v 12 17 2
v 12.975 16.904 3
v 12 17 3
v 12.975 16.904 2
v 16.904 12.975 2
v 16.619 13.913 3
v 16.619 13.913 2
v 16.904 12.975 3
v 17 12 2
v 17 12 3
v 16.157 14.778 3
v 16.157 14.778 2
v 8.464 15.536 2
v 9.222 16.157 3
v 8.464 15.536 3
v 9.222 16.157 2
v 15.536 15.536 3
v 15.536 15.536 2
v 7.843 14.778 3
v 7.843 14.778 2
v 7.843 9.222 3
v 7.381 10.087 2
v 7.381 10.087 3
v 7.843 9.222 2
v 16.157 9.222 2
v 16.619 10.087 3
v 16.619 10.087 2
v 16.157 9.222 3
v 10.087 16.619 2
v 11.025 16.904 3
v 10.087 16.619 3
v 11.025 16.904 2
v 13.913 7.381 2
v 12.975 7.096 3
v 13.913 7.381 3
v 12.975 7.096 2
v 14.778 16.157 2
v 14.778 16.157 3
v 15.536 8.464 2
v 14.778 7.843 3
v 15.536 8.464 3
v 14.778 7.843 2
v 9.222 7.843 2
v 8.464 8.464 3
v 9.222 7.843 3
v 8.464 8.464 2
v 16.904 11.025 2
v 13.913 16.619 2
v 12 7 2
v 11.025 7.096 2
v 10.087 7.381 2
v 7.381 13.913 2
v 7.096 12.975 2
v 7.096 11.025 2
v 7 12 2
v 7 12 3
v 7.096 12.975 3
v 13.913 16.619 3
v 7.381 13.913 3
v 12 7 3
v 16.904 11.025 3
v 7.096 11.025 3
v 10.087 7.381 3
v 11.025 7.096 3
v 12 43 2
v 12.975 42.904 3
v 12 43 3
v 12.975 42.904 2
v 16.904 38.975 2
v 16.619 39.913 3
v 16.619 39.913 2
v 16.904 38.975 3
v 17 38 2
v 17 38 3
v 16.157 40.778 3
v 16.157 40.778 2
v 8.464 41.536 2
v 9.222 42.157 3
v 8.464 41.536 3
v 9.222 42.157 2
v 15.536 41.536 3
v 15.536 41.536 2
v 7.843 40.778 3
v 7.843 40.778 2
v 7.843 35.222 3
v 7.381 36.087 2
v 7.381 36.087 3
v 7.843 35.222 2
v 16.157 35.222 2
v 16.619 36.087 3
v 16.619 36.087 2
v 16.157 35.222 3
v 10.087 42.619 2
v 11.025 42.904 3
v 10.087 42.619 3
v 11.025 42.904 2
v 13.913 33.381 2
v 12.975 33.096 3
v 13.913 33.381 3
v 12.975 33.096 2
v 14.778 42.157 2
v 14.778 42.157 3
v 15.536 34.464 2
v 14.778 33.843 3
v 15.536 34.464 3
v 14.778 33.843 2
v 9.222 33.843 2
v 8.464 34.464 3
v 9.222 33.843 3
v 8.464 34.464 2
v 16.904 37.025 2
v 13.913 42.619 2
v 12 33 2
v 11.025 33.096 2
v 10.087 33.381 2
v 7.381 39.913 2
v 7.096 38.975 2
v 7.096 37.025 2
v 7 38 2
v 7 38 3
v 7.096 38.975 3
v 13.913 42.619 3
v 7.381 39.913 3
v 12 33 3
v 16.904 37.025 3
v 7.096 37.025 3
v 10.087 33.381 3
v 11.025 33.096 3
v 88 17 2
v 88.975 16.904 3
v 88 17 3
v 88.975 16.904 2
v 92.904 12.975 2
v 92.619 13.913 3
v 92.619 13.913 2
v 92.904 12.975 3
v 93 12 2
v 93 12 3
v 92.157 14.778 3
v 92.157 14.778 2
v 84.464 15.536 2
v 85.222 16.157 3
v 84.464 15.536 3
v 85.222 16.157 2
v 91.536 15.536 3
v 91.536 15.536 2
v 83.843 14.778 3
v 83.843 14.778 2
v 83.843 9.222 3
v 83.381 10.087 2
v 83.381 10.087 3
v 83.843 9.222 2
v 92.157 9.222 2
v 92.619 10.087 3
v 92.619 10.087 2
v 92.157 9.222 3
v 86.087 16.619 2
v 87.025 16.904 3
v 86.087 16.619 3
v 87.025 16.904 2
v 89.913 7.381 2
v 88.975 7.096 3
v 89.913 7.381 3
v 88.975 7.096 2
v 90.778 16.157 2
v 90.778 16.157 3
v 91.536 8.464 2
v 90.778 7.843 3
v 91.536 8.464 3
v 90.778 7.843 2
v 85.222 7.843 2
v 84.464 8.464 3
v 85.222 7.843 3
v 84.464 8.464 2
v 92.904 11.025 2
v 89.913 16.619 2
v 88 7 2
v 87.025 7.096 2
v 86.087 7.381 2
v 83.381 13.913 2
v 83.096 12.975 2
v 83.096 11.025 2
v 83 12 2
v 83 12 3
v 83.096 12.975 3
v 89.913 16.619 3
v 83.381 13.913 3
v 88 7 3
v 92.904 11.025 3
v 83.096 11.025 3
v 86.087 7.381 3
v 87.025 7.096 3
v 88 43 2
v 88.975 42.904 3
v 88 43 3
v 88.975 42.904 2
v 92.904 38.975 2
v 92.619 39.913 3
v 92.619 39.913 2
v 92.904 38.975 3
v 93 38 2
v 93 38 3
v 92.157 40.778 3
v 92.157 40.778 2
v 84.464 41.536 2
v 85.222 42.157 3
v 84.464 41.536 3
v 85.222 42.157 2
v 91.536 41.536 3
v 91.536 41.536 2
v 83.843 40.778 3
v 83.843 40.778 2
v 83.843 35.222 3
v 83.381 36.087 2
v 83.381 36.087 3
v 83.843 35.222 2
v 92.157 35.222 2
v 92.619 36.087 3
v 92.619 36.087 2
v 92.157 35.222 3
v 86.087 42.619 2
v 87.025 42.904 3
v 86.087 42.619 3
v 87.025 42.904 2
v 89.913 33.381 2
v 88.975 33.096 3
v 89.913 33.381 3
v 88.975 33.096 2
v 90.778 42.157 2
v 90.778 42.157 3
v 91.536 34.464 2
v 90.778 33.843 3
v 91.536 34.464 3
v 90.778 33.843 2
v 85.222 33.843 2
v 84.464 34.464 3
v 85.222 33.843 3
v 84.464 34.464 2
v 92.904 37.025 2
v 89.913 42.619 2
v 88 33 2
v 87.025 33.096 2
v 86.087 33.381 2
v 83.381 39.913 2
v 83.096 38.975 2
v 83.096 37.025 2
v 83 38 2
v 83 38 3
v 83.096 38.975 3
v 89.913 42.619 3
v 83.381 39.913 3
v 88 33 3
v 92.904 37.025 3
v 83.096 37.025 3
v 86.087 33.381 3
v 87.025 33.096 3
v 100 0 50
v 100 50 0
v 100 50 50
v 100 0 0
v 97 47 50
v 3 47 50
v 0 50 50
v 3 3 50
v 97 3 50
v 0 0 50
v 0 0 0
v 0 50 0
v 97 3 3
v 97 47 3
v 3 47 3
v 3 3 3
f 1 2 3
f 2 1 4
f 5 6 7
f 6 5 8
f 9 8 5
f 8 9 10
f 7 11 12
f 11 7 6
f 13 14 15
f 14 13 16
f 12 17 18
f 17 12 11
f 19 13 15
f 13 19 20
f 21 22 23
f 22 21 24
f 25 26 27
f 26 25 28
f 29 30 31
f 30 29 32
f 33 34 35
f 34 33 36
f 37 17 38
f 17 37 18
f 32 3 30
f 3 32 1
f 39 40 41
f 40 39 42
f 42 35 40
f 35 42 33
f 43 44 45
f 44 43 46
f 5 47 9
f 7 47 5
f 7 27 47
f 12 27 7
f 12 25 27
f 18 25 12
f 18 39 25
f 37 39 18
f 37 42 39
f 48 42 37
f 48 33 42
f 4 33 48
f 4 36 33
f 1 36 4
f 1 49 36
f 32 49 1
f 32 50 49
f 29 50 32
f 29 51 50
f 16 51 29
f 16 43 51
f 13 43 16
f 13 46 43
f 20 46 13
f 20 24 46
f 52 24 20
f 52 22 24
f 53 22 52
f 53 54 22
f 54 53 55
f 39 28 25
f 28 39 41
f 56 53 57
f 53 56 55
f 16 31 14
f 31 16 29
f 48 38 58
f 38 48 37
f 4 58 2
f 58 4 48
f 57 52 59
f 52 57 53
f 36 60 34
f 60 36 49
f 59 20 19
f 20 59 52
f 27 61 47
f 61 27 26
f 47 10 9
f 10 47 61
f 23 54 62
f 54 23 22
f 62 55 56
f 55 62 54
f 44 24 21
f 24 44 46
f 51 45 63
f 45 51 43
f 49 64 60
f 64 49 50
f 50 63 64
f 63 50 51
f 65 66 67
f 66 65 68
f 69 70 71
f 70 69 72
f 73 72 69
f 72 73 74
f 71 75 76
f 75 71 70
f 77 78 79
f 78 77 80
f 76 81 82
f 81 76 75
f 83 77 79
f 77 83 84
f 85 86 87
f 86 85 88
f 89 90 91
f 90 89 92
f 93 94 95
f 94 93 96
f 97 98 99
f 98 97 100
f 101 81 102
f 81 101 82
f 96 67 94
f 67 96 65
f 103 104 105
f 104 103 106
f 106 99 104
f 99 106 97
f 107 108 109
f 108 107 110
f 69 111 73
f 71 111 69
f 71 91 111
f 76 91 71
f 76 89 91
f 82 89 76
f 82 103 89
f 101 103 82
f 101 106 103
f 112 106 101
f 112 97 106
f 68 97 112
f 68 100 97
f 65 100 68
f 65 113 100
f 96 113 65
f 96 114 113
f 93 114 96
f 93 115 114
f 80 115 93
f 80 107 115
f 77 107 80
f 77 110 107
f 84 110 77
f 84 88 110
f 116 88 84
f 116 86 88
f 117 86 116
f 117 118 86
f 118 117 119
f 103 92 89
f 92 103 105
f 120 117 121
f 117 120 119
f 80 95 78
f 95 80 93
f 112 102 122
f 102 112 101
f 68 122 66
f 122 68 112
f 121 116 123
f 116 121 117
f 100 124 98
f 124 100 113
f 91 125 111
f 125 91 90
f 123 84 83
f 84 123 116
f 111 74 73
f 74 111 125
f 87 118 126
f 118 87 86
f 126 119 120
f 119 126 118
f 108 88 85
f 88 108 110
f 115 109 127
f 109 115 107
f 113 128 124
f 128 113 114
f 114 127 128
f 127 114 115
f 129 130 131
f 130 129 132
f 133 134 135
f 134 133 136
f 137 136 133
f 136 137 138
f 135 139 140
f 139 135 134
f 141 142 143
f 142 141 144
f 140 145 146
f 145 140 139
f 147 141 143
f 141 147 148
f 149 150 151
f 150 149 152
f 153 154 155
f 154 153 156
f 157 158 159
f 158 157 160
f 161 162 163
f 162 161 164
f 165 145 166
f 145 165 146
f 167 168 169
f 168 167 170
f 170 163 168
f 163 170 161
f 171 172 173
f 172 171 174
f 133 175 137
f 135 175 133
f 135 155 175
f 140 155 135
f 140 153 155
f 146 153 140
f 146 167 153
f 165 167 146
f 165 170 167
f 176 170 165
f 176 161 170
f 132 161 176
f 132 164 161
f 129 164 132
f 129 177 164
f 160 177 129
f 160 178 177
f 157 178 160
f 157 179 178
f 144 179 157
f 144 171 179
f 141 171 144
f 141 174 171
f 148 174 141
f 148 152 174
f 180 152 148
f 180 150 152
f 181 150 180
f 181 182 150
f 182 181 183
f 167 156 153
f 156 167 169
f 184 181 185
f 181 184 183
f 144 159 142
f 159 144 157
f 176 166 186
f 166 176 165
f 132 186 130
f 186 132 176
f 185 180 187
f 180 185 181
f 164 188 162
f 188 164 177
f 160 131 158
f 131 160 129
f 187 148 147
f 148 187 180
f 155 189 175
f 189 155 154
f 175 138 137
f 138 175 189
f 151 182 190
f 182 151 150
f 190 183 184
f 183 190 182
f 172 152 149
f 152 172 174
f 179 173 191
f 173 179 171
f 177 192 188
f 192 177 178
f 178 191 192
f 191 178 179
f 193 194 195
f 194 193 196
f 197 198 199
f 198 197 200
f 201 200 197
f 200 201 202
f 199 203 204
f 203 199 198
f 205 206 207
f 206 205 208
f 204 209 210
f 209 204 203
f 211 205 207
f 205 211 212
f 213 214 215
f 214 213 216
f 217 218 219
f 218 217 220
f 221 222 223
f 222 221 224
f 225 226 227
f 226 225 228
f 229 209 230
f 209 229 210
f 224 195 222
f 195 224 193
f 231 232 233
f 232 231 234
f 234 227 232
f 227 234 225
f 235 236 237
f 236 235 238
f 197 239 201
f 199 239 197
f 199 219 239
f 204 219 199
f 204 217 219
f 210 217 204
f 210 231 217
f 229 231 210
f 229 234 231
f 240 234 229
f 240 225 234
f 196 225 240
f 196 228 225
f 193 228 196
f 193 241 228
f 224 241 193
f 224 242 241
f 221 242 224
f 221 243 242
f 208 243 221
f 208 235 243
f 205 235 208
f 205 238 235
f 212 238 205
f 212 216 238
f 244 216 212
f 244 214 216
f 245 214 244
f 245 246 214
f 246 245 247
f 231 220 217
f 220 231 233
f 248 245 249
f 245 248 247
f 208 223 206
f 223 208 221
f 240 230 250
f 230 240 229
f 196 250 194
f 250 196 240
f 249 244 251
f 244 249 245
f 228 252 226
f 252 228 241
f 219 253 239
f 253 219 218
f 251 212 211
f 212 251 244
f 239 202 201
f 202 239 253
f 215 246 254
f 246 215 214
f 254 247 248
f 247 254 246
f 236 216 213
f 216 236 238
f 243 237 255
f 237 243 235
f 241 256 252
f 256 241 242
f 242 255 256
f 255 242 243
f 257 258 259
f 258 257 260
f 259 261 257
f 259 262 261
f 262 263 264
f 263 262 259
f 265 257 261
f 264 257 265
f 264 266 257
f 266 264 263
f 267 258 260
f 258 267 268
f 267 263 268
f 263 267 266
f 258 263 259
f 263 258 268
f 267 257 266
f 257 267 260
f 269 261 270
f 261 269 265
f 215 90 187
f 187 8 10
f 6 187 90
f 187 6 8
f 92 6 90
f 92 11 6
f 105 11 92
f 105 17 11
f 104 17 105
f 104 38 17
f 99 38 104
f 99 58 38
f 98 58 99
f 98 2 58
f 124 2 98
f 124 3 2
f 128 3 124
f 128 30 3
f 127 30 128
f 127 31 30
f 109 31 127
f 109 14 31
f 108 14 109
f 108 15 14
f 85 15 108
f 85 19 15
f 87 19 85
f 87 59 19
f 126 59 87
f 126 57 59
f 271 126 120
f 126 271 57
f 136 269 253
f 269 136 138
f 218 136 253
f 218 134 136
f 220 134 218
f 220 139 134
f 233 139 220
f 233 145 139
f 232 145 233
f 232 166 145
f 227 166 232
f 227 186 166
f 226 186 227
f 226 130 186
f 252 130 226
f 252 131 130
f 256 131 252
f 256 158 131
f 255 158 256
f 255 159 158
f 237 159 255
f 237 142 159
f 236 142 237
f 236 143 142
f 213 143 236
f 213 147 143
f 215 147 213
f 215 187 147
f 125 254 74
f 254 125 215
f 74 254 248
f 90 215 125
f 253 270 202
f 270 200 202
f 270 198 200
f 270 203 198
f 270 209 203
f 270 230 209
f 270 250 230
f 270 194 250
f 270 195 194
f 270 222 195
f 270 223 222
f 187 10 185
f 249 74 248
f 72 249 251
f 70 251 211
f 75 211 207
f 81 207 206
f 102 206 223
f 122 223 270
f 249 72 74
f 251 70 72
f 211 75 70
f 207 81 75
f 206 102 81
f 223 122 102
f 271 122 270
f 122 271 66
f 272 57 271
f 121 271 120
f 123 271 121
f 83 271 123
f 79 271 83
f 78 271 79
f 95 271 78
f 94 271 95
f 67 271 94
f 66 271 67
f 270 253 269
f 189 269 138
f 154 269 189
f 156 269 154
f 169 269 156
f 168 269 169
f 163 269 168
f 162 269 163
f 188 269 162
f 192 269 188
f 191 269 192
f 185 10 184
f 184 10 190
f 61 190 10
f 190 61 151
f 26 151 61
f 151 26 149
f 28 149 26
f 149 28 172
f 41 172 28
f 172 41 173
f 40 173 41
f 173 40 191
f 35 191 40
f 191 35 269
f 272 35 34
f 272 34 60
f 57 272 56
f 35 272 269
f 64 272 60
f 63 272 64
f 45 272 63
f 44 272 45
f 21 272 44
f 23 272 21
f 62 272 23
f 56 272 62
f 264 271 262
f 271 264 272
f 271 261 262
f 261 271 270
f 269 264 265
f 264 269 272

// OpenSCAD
$fn = 32;

// ----------------------------------------------------------------------
// Enclosure box: bosses enclosure
// ----------------------------------------------------------------------

// --- parameters (mm) ---
box_l = 100;              // outer length, X
box_w = 50;               // outer width, Y
box_h = 50;               // outer height
wall_t = 3;               // wall thickness
boss_r = 5;               // corner boss radius
hole_r = 2;               // boss screw hole radius
boss_in = 12;             // boss inset from the corners

inner_h = box_h - wall_t;  // cavity depth
boss_h = inner_h - 2;  // corner boss height

difference() {
  cube([box_l, box_w, box_h]);
  translate([wall_t, wall_t, wall_t])
    cube([box_l - 2 * wall_t, box_w - 2 * wall_t, box_h]);
  for (sx = [0, 1], sy = [0, 1])
    translate([sx ? box_l - boss_in : boss_in,
               sy ? box_w - boss_in : boss_in, wall_t - 1]) {
      cylinder(r = boss_r, h = boss_h);
      translate([0, 0, boss_h - 4])
        cylinder(r = hole_r, h = 5);
    }
}
